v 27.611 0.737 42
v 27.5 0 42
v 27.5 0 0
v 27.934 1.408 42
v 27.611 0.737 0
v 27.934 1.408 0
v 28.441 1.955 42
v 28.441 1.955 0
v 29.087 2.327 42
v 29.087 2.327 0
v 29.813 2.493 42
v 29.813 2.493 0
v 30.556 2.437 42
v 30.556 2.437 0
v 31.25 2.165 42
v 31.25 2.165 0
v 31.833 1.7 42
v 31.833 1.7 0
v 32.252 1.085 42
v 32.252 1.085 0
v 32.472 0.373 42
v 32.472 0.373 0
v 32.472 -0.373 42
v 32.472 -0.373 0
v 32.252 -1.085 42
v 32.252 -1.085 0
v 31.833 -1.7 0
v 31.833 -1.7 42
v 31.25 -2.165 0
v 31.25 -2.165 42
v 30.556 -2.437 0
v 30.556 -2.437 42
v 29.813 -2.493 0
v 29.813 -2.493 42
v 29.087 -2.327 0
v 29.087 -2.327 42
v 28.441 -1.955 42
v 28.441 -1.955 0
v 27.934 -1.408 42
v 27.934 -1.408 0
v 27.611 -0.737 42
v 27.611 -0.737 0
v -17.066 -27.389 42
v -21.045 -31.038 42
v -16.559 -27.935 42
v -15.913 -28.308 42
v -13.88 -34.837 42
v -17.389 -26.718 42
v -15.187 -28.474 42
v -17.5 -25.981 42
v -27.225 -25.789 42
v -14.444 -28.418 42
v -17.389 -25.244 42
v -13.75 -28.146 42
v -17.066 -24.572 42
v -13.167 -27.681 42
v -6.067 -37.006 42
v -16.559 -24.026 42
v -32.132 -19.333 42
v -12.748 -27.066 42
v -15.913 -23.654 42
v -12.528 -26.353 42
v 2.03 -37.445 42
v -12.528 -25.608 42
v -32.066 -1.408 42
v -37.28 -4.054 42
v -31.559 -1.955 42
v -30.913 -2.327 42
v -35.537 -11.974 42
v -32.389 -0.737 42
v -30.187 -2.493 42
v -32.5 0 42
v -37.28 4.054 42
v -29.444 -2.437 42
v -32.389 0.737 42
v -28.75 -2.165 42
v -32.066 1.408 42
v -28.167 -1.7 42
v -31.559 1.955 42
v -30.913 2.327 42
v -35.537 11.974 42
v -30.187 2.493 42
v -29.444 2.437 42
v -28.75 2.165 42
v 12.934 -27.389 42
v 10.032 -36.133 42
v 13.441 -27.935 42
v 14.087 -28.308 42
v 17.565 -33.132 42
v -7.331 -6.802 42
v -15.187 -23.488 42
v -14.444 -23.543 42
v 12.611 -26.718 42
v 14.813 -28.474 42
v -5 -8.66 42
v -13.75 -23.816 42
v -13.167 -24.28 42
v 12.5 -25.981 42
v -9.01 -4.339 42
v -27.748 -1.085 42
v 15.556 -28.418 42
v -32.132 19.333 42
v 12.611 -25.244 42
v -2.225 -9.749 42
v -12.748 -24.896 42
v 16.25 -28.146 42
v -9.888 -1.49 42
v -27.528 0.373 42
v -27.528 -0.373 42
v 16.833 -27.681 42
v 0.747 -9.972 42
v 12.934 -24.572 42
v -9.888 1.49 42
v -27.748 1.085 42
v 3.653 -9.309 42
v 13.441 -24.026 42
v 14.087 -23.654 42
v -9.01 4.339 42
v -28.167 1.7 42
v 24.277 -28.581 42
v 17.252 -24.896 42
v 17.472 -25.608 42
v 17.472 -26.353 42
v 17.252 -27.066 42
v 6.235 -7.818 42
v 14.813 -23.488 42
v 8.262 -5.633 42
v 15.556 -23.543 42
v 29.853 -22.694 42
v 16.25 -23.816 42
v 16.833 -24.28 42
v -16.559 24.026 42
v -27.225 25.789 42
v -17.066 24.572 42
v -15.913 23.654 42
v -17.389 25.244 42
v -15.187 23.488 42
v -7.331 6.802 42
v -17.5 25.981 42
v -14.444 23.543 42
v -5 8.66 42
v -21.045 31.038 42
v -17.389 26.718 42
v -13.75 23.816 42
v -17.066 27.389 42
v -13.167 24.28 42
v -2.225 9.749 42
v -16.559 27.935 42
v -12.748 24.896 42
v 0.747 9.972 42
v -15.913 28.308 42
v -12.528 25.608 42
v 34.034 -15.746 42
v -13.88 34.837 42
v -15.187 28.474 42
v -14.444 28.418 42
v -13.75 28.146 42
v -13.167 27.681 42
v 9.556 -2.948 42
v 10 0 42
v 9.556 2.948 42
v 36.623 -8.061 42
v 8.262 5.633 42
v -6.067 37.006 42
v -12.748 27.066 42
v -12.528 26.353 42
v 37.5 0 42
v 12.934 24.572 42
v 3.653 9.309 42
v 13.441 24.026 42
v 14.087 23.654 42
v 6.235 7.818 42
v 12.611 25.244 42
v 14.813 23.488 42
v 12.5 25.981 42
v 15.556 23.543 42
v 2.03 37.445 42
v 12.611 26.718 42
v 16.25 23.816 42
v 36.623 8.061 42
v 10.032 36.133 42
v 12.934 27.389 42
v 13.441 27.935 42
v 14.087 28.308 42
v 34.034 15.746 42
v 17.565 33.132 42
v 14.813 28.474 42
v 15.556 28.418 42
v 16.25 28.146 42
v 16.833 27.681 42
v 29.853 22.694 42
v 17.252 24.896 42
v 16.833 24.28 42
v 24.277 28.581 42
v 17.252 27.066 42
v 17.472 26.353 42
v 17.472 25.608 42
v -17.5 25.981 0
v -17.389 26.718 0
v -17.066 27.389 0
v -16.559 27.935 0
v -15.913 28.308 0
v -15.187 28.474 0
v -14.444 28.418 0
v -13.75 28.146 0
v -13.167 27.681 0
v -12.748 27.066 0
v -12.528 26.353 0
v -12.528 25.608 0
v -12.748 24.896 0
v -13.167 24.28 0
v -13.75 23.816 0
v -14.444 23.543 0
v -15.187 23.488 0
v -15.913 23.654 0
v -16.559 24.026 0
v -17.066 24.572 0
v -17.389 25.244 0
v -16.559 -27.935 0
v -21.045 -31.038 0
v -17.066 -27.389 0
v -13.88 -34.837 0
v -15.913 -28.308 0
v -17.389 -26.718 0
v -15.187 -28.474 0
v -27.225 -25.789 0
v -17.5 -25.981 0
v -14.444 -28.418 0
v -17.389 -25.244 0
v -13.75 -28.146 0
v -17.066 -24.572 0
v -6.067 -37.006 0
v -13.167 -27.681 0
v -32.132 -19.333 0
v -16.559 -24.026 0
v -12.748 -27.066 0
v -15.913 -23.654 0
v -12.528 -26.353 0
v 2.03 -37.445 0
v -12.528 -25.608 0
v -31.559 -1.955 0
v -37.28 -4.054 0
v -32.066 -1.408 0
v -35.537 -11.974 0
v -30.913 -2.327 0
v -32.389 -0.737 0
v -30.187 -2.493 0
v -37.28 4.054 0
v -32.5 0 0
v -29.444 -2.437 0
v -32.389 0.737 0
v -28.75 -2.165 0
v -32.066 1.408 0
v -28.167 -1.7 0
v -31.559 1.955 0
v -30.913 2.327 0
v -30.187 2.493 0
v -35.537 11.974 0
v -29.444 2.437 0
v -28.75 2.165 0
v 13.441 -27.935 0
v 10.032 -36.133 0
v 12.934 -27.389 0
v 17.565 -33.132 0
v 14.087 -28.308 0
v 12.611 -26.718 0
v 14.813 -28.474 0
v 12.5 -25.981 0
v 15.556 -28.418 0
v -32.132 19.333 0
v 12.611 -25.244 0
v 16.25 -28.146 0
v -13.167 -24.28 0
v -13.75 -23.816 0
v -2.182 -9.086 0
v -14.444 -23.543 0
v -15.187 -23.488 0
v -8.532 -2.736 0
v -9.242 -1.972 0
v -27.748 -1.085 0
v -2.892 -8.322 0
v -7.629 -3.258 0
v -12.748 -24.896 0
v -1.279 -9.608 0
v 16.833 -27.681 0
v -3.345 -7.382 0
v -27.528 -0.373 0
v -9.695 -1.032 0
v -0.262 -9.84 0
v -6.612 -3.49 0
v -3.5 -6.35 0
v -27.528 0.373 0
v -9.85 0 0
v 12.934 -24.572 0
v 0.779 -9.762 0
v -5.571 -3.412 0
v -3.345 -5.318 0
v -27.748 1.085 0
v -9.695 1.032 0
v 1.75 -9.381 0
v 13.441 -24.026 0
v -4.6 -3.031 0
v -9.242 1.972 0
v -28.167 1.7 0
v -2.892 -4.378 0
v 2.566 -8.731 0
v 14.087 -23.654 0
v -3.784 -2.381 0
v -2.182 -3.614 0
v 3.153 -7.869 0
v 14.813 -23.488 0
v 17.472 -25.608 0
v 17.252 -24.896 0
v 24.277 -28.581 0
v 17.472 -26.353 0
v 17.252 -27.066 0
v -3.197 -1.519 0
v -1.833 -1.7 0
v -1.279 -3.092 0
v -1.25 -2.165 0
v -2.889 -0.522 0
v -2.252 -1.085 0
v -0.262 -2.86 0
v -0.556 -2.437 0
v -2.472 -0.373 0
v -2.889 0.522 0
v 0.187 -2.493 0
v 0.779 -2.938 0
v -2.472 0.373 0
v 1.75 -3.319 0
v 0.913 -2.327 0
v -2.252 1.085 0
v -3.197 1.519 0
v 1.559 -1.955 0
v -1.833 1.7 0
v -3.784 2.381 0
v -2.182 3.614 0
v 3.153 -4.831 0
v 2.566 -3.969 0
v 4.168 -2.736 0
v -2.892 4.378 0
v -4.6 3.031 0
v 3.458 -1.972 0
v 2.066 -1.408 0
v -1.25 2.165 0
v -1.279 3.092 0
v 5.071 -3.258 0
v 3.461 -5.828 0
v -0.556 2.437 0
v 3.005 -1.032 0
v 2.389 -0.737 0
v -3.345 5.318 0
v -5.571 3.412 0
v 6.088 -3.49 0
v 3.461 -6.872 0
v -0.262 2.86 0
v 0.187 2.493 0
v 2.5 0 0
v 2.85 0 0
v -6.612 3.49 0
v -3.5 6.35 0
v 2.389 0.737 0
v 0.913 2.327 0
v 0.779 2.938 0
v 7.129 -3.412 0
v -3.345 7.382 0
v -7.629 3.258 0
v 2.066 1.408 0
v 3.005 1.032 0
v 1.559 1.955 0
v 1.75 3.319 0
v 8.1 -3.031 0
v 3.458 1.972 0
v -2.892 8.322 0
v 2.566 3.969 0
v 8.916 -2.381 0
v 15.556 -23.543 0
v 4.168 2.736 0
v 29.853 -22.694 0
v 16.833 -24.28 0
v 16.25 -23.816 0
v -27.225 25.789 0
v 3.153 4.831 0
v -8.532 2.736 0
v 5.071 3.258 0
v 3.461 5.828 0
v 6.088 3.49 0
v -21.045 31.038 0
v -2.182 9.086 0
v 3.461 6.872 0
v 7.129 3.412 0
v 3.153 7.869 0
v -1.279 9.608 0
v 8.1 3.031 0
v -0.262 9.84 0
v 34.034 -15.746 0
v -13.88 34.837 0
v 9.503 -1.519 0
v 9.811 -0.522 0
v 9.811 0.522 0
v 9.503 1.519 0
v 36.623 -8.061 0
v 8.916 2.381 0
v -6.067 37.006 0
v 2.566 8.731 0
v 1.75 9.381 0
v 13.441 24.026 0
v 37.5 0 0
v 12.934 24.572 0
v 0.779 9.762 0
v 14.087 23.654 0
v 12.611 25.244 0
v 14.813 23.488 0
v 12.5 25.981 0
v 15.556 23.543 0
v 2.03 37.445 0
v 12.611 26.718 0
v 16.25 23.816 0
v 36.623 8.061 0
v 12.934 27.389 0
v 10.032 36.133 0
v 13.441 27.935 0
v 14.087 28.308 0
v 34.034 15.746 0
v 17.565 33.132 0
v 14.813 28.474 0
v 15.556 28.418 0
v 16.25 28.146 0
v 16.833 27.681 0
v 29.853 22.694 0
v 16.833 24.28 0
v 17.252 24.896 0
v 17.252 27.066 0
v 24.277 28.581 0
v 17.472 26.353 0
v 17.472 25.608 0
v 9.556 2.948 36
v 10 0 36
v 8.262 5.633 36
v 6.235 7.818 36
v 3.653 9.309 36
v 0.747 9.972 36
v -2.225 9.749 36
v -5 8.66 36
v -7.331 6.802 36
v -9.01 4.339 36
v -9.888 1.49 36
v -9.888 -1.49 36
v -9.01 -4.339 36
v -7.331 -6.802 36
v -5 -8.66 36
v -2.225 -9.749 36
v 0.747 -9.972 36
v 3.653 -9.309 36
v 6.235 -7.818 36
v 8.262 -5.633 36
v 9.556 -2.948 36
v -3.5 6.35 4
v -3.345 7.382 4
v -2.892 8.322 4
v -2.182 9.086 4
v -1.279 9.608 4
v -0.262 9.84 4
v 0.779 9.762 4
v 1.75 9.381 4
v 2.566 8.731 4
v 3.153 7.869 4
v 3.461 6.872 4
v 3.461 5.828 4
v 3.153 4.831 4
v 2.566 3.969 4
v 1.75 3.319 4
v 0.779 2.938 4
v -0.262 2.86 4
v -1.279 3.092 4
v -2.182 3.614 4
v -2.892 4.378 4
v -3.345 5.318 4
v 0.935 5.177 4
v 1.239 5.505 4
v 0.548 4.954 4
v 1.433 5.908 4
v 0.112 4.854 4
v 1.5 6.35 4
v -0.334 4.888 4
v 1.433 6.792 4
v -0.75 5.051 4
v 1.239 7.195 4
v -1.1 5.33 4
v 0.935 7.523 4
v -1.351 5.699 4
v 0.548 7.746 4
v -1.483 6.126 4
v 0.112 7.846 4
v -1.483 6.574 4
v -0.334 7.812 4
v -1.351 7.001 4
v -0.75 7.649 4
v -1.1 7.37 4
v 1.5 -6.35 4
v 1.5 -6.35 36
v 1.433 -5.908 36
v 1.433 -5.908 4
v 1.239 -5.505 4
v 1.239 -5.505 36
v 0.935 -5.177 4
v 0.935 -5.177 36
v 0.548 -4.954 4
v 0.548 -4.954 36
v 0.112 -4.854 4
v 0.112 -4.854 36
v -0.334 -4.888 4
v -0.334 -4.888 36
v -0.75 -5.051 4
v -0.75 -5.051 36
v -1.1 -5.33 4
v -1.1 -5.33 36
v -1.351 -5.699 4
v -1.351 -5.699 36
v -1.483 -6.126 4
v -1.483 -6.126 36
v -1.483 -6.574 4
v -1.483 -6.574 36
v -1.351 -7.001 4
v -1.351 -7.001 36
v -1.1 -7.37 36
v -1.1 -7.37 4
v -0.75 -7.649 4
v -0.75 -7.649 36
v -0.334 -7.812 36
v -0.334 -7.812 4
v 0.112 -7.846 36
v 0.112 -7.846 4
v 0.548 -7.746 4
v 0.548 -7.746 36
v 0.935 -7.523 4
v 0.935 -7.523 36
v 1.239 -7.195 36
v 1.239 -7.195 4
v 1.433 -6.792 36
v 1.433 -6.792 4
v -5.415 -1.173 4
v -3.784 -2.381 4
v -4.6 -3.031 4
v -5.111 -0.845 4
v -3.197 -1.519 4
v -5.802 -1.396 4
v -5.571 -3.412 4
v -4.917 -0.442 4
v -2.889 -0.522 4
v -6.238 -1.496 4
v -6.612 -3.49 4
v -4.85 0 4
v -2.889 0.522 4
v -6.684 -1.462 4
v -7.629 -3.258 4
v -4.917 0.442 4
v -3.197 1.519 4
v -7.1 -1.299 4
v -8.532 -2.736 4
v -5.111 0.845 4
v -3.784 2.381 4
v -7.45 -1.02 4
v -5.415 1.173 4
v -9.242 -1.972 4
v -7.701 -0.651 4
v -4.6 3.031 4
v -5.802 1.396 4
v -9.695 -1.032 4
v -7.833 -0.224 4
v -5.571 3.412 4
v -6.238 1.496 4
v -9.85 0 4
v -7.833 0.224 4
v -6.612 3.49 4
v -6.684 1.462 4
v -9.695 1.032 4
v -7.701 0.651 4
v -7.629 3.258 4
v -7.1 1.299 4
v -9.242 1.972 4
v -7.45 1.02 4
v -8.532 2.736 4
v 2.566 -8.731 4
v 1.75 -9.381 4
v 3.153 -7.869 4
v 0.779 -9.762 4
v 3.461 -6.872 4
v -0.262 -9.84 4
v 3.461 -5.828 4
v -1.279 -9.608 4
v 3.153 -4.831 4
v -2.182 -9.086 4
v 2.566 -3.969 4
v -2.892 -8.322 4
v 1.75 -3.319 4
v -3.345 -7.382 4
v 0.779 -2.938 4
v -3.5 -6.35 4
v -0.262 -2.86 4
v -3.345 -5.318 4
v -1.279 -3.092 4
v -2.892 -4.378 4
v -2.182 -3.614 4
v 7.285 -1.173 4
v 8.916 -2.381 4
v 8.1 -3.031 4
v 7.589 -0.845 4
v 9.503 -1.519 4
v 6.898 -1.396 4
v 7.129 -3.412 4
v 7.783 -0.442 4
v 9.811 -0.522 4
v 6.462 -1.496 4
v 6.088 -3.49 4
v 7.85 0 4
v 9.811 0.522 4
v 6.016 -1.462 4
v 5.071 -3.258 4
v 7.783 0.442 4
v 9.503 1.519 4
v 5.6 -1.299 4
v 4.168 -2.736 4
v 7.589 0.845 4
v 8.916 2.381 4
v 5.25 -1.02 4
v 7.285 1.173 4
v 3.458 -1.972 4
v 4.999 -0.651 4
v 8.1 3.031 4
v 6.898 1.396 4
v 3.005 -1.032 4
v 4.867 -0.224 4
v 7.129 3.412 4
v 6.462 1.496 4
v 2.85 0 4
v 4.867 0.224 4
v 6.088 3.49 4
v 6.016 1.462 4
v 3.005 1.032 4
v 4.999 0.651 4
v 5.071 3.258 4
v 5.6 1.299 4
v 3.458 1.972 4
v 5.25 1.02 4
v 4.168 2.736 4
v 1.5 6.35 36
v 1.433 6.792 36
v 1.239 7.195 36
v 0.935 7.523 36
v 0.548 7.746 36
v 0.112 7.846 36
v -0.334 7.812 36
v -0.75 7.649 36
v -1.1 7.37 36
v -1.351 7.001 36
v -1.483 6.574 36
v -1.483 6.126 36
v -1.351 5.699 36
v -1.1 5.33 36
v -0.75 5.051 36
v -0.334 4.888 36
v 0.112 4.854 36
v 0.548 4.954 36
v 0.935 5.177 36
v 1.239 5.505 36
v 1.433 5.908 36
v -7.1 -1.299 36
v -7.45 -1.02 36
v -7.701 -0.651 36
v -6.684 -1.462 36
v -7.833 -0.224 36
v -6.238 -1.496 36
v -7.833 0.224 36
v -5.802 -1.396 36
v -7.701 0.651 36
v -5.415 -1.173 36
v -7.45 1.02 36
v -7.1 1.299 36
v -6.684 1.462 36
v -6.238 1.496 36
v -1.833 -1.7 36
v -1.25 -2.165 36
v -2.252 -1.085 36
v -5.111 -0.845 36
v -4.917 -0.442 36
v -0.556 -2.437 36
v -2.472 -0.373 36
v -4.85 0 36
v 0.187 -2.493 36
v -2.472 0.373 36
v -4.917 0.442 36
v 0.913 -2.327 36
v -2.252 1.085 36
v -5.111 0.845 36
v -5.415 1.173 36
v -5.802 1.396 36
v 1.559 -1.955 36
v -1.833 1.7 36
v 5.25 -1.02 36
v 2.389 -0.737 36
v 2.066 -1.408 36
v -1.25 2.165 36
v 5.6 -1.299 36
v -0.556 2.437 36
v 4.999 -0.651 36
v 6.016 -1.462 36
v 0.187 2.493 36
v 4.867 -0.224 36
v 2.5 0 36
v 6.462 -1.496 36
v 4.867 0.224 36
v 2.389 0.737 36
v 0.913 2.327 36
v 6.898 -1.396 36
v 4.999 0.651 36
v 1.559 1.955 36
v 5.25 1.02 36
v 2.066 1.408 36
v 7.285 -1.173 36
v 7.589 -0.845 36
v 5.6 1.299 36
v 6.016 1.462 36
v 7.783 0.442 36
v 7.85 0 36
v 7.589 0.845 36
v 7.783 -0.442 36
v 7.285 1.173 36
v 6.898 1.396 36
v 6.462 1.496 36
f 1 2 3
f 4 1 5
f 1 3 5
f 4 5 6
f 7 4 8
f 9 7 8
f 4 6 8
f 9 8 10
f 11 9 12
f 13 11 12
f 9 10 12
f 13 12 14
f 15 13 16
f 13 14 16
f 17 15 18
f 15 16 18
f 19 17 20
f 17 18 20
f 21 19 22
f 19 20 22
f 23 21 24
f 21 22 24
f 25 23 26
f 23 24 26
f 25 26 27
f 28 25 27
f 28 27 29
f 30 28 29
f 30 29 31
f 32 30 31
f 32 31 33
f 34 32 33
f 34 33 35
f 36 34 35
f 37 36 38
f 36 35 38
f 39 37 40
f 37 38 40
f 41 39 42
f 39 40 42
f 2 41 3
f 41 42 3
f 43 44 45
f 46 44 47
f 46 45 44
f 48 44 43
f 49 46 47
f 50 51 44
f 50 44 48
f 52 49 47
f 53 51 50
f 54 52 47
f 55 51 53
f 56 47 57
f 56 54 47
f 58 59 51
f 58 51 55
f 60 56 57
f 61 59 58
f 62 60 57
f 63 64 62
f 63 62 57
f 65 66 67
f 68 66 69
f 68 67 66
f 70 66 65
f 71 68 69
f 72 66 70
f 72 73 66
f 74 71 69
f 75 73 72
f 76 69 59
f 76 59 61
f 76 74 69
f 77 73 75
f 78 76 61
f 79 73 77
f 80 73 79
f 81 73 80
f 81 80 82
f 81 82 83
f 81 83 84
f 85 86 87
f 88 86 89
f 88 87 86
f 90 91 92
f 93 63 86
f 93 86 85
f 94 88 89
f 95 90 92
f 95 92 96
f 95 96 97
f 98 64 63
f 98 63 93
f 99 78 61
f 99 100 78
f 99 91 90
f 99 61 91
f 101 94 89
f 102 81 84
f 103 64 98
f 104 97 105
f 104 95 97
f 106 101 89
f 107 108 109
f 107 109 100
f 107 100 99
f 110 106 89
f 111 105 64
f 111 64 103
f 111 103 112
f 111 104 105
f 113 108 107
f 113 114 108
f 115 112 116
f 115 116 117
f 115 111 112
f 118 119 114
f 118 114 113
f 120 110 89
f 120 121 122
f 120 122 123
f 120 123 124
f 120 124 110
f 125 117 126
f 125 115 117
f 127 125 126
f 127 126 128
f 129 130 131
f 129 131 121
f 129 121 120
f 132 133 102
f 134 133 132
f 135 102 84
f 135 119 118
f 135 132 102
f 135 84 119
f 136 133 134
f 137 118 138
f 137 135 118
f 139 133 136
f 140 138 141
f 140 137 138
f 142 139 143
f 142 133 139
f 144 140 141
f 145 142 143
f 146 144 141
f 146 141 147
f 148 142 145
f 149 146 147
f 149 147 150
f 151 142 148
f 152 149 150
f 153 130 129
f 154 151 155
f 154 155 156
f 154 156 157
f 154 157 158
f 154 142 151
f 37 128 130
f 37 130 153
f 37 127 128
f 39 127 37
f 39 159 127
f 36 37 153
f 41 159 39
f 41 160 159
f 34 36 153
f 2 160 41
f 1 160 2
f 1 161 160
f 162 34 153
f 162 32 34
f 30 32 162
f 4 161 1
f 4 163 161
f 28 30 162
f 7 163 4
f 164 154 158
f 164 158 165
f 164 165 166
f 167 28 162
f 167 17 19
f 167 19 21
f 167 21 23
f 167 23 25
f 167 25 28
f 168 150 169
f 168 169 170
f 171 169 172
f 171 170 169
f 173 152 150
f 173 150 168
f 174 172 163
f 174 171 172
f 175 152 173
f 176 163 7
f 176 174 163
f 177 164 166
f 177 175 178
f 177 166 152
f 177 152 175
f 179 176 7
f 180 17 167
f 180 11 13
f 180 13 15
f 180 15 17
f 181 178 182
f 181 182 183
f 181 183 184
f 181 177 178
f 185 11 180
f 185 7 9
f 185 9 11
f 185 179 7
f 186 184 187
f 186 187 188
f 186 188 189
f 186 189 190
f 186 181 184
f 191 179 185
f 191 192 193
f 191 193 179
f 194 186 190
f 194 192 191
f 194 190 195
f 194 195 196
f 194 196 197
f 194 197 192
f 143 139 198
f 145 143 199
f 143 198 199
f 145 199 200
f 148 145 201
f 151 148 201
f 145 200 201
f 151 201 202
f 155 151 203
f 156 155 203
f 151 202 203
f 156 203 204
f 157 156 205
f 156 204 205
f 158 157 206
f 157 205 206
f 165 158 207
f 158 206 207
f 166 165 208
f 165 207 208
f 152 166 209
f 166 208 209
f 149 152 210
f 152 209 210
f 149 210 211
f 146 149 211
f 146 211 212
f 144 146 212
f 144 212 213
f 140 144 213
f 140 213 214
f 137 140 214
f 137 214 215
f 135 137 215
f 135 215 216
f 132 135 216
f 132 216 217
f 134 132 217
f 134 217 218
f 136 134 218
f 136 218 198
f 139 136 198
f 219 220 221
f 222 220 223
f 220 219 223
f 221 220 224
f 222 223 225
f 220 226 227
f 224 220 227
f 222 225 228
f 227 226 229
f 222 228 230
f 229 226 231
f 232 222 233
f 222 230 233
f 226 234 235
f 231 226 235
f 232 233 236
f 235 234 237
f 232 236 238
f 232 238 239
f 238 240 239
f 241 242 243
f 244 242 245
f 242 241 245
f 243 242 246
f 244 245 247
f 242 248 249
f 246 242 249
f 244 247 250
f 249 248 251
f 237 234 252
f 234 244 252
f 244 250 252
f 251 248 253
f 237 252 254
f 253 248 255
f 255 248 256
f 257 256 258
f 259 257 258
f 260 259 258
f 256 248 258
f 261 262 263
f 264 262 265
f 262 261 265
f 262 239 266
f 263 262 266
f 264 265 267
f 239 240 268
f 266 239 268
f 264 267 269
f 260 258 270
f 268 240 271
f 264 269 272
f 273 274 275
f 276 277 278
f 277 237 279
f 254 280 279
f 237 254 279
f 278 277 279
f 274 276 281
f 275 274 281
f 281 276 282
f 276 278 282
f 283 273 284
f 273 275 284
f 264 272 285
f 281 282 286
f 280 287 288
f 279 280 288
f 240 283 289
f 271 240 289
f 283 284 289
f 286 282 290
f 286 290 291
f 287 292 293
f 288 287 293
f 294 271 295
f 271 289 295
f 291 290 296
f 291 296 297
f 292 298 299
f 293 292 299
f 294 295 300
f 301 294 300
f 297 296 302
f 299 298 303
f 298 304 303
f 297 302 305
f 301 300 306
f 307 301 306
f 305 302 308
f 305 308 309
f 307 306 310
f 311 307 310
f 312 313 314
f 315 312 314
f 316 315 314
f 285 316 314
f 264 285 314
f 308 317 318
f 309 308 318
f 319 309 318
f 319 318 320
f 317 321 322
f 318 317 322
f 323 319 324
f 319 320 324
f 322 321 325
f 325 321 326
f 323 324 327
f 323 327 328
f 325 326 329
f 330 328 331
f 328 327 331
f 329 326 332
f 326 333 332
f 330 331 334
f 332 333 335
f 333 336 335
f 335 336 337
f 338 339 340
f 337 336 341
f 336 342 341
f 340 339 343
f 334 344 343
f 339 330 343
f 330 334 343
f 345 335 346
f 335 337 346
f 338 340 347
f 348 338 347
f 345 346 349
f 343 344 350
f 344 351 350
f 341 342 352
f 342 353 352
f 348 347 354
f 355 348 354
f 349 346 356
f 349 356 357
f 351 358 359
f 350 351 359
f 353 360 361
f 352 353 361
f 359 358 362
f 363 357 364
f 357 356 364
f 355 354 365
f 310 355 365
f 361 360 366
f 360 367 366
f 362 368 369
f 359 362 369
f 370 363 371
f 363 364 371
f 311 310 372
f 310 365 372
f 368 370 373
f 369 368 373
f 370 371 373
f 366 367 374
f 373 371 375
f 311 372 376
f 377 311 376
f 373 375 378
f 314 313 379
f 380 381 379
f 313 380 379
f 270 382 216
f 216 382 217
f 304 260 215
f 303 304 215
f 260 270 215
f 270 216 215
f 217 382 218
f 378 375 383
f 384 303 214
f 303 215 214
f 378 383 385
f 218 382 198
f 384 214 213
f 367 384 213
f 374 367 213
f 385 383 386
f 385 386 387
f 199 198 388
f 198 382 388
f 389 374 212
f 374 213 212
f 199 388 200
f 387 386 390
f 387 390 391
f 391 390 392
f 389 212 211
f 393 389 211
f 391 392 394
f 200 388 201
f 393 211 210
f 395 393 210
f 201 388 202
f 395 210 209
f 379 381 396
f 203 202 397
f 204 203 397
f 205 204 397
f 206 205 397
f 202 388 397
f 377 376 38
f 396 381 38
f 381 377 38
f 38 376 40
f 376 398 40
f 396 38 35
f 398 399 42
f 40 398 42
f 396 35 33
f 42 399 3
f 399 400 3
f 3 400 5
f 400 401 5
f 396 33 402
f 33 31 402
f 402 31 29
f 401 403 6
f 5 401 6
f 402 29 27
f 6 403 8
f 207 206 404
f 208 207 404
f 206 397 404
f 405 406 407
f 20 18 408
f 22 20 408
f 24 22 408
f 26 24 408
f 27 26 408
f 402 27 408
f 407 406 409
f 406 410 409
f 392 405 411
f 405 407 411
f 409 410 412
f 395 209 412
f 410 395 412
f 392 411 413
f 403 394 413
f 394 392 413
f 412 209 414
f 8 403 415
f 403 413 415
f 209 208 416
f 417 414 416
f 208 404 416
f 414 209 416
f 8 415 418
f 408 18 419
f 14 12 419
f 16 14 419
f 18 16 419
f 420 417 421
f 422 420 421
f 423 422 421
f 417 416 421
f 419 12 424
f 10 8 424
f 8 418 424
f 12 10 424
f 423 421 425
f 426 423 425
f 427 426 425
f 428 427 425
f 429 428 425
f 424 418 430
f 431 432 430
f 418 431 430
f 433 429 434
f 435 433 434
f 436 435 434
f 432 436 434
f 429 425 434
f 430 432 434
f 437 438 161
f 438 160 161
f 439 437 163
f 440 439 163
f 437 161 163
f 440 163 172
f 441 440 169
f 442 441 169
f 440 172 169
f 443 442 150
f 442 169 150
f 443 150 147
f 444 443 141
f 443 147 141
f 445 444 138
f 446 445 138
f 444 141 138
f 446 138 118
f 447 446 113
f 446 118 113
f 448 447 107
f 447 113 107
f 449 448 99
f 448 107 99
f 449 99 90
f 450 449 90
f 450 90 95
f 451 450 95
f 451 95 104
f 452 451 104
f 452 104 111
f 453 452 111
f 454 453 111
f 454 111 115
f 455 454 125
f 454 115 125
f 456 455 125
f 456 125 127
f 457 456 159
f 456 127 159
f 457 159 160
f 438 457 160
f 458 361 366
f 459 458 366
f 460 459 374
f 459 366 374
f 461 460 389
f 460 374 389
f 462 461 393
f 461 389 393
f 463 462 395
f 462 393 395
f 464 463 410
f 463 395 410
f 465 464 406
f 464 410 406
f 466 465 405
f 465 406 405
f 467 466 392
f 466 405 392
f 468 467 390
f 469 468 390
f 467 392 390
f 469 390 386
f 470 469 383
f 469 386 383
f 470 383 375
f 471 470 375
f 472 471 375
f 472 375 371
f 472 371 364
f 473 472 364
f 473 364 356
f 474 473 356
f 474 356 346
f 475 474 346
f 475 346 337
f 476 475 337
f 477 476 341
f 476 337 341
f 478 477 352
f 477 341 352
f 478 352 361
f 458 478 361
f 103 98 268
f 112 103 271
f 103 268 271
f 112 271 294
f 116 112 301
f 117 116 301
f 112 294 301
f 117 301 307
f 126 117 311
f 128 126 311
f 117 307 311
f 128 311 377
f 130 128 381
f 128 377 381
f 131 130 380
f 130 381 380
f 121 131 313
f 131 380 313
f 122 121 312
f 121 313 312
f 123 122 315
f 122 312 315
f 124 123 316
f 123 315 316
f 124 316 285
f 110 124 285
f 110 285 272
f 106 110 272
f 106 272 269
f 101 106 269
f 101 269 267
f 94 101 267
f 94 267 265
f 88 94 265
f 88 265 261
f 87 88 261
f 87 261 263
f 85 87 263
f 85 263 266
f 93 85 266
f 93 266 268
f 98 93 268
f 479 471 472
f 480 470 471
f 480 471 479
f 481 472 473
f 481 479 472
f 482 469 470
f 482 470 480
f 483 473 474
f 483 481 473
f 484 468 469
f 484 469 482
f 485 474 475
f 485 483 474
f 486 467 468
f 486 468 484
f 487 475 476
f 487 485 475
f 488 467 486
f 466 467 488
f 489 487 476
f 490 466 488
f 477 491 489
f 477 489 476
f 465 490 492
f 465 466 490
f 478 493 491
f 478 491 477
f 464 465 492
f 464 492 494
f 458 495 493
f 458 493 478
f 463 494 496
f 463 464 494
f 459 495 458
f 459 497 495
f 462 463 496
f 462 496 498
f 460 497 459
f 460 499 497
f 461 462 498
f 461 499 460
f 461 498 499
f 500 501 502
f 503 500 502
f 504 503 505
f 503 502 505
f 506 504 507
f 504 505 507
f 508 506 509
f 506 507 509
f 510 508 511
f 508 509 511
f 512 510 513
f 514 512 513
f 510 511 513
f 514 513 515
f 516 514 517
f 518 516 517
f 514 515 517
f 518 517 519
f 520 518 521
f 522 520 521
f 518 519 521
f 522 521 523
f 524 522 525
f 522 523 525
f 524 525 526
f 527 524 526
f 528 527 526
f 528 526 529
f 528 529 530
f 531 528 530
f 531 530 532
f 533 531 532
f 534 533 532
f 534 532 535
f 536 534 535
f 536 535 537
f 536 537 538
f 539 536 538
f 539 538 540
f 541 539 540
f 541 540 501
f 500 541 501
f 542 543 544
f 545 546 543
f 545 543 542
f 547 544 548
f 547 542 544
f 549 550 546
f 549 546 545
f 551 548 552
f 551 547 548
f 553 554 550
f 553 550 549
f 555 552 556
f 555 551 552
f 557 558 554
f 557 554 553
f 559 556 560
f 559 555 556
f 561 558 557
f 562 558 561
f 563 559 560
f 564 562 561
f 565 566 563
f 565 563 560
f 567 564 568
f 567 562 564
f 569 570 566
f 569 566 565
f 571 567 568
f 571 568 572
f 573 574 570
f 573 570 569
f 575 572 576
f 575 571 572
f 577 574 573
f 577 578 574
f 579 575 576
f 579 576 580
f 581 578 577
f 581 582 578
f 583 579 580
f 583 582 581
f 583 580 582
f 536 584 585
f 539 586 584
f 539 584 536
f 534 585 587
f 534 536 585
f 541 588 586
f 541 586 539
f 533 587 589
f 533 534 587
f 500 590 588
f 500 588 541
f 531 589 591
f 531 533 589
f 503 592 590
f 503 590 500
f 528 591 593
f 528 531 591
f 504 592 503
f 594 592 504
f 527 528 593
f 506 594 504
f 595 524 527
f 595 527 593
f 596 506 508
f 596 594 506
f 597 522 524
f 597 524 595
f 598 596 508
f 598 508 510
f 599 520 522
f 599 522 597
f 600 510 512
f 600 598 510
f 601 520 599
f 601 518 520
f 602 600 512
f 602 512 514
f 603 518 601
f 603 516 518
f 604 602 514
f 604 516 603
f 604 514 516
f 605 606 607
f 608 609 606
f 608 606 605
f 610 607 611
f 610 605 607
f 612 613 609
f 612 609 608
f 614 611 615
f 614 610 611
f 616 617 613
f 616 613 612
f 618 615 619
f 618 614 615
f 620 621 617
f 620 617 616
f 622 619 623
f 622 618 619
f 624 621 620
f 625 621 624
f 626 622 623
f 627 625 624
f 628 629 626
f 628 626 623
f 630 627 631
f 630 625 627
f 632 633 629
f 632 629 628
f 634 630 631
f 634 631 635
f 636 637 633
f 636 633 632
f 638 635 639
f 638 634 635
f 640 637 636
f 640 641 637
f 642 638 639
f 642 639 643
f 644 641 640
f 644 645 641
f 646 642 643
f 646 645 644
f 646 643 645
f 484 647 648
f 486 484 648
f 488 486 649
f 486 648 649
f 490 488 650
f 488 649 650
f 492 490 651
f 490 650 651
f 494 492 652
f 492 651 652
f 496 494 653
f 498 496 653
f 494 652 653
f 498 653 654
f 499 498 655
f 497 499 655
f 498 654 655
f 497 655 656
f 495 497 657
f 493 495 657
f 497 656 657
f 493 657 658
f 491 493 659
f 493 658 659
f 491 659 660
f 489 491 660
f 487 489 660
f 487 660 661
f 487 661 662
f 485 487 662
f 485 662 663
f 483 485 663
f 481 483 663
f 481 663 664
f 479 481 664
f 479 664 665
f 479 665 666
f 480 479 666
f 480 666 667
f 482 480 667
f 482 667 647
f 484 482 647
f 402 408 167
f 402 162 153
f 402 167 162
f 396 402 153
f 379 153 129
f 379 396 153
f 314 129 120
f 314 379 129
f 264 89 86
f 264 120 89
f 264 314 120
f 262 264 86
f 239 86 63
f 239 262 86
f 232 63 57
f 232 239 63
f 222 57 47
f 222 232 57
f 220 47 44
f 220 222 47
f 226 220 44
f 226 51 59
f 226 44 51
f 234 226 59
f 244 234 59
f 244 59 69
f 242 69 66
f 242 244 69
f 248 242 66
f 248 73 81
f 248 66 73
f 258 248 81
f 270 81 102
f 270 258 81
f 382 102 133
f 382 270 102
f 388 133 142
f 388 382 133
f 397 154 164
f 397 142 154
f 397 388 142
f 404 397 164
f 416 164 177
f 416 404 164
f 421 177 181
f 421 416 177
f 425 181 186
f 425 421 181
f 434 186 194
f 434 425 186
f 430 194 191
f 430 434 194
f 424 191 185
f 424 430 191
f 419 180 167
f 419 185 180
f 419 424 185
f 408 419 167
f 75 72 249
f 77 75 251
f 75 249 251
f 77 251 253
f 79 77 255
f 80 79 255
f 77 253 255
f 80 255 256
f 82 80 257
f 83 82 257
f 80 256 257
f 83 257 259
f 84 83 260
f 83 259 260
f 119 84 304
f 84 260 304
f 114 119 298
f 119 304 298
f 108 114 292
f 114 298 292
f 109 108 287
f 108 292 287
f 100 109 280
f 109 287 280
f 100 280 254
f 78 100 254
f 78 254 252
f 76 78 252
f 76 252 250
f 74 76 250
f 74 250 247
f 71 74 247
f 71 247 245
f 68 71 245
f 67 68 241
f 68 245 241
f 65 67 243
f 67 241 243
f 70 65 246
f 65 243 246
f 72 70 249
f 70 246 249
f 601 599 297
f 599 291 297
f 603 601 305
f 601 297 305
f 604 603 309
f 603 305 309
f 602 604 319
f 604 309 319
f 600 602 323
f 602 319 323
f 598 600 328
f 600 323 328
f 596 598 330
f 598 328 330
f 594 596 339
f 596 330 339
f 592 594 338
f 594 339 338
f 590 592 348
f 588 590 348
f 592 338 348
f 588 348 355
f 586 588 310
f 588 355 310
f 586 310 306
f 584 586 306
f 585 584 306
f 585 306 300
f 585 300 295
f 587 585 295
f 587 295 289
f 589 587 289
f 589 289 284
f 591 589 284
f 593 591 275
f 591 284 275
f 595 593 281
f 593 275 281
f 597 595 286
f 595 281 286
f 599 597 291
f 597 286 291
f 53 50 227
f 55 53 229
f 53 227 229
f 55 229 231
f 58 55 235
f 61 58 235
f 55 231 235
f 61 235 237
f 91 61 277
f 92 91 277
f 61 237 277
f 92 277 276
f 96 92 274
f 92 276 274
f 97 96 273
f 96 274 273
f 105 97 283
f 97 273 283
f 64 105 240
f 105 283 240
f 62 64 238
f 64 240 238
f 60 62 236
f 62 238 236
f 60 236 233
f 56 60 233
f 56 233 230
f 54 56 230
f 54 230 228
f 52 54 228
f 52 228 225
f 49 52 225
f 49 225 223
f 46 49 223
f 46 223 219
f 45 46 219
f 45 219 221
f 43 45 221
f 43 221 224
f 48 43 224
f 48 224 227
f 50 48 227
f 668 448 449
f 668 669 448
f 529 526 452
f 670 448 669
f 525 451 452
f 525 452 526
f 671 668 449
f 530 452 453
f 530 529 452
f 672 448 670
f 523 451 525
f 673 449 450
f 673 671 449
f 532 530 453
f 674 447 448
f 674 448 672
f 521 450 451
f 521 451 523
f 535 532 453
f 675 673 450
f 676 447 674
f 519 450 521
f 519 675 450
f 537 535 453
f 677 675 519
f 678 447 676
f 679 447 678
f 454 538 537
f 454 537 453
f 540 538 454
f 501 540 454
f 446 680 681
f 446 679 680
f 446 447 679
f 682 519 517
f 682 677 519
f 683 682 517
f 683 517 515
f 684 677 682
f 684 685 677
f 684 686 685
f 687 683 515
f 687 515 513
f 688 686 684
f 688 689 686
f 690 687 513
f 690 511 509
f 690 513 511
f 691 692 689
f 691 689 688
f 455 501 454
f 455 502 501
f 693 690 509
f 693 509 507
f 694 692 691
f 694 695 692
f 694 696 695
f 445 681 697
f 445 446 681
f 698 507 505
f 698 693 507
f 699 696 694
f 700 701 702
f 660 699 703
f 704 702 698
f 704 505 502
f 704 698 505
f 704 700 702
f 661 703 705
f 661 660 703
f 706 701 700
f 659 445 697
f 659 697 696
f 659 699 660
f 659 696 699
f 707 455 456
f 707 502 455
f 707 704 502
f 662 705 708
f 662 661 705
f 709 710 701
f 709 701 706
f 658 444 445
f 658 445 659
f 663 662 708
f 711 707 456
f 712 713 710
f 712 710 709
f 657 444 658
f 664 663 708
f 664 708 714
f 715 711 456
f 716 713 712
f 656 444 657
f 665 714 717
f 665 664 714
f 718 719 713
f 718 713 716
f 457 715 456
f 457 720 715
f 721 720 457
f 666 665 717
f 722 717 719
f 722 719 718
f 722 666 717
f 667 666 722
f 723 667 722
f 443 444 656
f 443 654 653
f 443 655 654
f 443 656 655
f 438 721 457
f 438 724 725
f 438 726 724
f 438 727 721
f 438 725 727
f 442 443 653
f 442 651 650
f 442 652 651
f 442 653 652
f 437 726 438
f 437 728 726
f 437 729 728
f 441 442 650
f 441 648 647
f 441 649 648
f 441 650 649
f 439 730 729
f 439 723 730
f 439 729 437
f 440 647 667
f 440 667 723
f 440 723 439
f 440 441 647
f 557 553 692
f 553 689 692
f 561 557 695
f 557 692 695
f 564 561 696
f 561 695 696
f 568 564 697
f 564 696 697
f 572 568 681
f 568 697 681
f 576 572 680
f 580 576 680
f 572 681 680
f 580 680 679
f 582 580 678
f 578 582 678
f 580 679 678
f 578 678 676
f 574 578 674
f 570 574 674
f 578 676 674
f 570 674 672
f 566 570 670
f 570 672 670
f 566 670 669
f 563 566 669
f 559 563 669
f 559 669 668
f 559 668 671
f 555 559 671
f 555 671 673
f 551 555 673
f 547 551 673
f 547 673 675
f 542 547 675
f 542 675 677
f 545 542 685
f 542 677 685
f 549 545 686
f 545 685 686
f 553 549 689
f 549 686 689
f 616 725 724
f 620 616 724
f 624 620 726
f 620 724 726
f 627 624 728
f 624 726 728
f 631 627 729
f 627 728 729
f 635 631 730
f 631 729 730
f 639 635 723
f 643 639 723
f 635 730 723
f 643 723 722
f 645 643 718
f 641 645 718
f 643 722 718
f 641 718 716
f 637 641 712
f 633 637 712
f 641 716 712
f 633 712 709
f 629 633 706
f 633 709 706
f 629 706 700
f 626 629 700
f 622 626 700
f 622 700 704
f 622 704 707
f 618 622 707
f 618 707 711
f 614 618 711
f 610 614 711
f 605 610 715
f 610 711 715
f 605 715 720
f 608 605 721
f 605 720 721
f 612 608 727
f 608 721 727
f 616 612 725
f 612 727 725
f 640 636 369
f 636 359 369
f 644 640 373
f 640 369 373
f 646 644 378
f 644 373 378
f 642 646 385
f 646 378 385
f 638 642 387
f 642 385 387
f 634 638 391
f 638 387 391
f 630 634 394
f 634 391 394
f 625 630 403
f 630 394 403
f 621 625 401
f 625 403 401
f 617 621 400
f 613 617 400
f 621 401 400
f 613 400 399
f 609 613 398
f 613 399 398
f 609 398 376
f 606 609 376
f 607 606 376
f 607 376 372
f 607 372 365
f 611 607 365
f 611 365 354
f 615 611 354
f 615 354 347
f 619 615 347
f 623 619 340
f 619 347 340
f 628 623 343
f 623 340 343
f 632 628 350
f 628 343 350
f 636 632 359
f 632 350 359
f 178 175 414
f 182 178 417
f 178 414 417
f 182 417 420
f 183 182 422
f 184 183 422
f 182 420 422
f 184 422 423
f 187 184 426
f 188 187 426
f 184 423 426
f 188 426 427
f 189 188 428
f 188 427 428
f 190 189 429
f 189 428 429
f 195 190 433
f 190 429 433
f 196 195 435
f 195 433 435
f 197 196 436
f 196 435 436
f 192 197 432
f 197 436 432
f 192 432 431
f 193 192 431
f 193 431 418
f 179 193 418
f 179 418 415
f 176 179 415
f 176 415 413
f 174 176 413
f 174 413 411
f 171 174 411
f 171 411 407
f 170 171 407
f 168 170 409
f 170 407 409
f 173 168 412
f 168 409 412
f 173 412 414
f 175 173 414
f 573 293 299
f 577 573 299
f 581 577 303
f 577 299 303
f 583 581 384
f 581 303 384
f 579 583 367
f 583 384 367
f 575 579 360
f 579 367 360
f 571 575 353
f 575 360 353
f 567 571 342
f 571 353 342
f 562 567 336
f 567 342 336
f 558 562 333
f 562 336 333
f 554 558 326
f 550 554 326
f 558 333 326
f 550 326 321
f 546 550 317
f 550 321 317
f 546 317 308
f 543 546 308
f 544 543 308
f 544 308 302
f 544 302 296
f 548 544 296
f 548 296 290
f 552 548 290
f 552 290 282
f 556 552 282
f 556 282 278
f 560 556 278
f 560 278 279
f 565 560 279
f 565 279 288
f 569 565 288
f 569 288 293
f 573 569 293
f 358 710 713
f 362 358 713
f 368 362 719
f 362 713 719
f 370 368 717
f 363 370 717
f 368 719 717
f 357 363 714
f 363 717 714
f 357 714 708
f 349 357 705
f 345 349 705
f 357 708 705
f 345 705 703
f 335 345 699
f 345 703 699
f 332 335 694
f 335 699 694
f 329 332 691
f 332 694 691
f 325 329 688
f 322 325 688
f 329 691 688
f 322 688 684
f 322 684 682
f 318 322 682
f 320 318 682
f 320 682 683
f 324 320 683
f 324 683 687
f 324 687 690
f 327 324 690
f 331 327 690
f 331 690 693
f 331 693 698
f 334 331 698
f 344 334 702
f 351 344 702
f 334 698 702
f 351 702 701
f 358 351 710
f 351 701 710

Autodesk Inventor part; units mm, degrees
ref_plane "YZ Plane" through (0, 0, 0) normal (1, 0, 0) x (0, 1, 0)
ref_plane "XZ Plane" through (0, 0, 0) normal (0, 1, 0) x (-1, 0, 0)
ref_plane "XY Plane" through (0, 0, 0) normal (0, 0, 1) x (1, 0, 0)
sketch "Sketch1" plane through (0, 0, 0) normal (0, 0, 1) x (1, 0, 0)
  circle A0 centre (0, 0) radius 37.5
  dimension "d0" = 75
extrude "Extrusion1" add sketch "Sketch1" along normal blind 42
sketch "Sketch2" plane through (0, 0, 42) normal (0, 0, 1) x (1, 0, 0)
  circle A0 centre (0, 0) radius 10
  dimension "d3" = 20
extrude "Extrusion2" cut sketch "Sketch2" against normal blind 6
sketch "Sketch3" plane through (0, 0, 36) normal (0, 0, 1) x (1, 0, 0)
  circle A0 centre (6.35, 0) radius 1.5
  circle A1 centre (0, 6.35) radius 1.5
  circle A2 centre (-6.35, 0) radius 1.5
  circle A3 centre (0, -6.35) radius 1.5
  point P0 (0, 0)
  dimension "d6" = 3
  dimension "d7" = 6.35
  dimension "d10" = 360
extrude "Extrusion3" cut sketch "Sketch3" against normal through all
sketch "Sketch4" plane through (0, 0, 36) normal (0, 0, 1) x (1, 0, 0)
  circle A0 centre (0, 0) radius 2.5
  dimension "d14" = 5
extrude "Extrusion4" cut sketch "Sketch4" against normal through all
sketch "Sketch5" plane through (0, 0, 0) normal (0, 0, -1) x (-1, 0, 0)
  circle A0 centre (6.35, 0) radius 1.5 projected
  circle A1 centre (6.35, 0) radius 3.5
  circle A2 centre (0, 6.35) radius 3.5
  circle A3 centre (-6.35, 0) radius 3.5
  circle A4 centre (0, -6.35) radius 3.5
  point P0 (0, 0)
  dimension "d17" = 7
  dimension "d20" = 360
extrude "Extrusion5" cut sketch "Sketch5" against normal blind 4 contours A0 | A1 | A2 | A3 | A4
sketch "Sketch6" plane through (0, 0, 0) normal (0, 0, -1) x (-1, 0, 0)
  circle A0 centre (-30, 0) radius 2.5
  circle A1 centre (-15, -25.9808) radius 2.5
  circle A2 centre (15, -25.9808) radius 2.5
  circle A3 centre (30, 0) radius 2.5
  circle A4 centre (15, 25.9808) radius 2.5
  circle A5 centre (-15, 25.9808) radius 2.5
  point P0 (0, 0)
  dimension "d24" = 5
  dimension "d25" = 30
  dimension "d28" = 360
extrude "Extrusion6" cut sketch "Sketch6" against normal through all
properties part number "HA012" material "ABS Plastic"
